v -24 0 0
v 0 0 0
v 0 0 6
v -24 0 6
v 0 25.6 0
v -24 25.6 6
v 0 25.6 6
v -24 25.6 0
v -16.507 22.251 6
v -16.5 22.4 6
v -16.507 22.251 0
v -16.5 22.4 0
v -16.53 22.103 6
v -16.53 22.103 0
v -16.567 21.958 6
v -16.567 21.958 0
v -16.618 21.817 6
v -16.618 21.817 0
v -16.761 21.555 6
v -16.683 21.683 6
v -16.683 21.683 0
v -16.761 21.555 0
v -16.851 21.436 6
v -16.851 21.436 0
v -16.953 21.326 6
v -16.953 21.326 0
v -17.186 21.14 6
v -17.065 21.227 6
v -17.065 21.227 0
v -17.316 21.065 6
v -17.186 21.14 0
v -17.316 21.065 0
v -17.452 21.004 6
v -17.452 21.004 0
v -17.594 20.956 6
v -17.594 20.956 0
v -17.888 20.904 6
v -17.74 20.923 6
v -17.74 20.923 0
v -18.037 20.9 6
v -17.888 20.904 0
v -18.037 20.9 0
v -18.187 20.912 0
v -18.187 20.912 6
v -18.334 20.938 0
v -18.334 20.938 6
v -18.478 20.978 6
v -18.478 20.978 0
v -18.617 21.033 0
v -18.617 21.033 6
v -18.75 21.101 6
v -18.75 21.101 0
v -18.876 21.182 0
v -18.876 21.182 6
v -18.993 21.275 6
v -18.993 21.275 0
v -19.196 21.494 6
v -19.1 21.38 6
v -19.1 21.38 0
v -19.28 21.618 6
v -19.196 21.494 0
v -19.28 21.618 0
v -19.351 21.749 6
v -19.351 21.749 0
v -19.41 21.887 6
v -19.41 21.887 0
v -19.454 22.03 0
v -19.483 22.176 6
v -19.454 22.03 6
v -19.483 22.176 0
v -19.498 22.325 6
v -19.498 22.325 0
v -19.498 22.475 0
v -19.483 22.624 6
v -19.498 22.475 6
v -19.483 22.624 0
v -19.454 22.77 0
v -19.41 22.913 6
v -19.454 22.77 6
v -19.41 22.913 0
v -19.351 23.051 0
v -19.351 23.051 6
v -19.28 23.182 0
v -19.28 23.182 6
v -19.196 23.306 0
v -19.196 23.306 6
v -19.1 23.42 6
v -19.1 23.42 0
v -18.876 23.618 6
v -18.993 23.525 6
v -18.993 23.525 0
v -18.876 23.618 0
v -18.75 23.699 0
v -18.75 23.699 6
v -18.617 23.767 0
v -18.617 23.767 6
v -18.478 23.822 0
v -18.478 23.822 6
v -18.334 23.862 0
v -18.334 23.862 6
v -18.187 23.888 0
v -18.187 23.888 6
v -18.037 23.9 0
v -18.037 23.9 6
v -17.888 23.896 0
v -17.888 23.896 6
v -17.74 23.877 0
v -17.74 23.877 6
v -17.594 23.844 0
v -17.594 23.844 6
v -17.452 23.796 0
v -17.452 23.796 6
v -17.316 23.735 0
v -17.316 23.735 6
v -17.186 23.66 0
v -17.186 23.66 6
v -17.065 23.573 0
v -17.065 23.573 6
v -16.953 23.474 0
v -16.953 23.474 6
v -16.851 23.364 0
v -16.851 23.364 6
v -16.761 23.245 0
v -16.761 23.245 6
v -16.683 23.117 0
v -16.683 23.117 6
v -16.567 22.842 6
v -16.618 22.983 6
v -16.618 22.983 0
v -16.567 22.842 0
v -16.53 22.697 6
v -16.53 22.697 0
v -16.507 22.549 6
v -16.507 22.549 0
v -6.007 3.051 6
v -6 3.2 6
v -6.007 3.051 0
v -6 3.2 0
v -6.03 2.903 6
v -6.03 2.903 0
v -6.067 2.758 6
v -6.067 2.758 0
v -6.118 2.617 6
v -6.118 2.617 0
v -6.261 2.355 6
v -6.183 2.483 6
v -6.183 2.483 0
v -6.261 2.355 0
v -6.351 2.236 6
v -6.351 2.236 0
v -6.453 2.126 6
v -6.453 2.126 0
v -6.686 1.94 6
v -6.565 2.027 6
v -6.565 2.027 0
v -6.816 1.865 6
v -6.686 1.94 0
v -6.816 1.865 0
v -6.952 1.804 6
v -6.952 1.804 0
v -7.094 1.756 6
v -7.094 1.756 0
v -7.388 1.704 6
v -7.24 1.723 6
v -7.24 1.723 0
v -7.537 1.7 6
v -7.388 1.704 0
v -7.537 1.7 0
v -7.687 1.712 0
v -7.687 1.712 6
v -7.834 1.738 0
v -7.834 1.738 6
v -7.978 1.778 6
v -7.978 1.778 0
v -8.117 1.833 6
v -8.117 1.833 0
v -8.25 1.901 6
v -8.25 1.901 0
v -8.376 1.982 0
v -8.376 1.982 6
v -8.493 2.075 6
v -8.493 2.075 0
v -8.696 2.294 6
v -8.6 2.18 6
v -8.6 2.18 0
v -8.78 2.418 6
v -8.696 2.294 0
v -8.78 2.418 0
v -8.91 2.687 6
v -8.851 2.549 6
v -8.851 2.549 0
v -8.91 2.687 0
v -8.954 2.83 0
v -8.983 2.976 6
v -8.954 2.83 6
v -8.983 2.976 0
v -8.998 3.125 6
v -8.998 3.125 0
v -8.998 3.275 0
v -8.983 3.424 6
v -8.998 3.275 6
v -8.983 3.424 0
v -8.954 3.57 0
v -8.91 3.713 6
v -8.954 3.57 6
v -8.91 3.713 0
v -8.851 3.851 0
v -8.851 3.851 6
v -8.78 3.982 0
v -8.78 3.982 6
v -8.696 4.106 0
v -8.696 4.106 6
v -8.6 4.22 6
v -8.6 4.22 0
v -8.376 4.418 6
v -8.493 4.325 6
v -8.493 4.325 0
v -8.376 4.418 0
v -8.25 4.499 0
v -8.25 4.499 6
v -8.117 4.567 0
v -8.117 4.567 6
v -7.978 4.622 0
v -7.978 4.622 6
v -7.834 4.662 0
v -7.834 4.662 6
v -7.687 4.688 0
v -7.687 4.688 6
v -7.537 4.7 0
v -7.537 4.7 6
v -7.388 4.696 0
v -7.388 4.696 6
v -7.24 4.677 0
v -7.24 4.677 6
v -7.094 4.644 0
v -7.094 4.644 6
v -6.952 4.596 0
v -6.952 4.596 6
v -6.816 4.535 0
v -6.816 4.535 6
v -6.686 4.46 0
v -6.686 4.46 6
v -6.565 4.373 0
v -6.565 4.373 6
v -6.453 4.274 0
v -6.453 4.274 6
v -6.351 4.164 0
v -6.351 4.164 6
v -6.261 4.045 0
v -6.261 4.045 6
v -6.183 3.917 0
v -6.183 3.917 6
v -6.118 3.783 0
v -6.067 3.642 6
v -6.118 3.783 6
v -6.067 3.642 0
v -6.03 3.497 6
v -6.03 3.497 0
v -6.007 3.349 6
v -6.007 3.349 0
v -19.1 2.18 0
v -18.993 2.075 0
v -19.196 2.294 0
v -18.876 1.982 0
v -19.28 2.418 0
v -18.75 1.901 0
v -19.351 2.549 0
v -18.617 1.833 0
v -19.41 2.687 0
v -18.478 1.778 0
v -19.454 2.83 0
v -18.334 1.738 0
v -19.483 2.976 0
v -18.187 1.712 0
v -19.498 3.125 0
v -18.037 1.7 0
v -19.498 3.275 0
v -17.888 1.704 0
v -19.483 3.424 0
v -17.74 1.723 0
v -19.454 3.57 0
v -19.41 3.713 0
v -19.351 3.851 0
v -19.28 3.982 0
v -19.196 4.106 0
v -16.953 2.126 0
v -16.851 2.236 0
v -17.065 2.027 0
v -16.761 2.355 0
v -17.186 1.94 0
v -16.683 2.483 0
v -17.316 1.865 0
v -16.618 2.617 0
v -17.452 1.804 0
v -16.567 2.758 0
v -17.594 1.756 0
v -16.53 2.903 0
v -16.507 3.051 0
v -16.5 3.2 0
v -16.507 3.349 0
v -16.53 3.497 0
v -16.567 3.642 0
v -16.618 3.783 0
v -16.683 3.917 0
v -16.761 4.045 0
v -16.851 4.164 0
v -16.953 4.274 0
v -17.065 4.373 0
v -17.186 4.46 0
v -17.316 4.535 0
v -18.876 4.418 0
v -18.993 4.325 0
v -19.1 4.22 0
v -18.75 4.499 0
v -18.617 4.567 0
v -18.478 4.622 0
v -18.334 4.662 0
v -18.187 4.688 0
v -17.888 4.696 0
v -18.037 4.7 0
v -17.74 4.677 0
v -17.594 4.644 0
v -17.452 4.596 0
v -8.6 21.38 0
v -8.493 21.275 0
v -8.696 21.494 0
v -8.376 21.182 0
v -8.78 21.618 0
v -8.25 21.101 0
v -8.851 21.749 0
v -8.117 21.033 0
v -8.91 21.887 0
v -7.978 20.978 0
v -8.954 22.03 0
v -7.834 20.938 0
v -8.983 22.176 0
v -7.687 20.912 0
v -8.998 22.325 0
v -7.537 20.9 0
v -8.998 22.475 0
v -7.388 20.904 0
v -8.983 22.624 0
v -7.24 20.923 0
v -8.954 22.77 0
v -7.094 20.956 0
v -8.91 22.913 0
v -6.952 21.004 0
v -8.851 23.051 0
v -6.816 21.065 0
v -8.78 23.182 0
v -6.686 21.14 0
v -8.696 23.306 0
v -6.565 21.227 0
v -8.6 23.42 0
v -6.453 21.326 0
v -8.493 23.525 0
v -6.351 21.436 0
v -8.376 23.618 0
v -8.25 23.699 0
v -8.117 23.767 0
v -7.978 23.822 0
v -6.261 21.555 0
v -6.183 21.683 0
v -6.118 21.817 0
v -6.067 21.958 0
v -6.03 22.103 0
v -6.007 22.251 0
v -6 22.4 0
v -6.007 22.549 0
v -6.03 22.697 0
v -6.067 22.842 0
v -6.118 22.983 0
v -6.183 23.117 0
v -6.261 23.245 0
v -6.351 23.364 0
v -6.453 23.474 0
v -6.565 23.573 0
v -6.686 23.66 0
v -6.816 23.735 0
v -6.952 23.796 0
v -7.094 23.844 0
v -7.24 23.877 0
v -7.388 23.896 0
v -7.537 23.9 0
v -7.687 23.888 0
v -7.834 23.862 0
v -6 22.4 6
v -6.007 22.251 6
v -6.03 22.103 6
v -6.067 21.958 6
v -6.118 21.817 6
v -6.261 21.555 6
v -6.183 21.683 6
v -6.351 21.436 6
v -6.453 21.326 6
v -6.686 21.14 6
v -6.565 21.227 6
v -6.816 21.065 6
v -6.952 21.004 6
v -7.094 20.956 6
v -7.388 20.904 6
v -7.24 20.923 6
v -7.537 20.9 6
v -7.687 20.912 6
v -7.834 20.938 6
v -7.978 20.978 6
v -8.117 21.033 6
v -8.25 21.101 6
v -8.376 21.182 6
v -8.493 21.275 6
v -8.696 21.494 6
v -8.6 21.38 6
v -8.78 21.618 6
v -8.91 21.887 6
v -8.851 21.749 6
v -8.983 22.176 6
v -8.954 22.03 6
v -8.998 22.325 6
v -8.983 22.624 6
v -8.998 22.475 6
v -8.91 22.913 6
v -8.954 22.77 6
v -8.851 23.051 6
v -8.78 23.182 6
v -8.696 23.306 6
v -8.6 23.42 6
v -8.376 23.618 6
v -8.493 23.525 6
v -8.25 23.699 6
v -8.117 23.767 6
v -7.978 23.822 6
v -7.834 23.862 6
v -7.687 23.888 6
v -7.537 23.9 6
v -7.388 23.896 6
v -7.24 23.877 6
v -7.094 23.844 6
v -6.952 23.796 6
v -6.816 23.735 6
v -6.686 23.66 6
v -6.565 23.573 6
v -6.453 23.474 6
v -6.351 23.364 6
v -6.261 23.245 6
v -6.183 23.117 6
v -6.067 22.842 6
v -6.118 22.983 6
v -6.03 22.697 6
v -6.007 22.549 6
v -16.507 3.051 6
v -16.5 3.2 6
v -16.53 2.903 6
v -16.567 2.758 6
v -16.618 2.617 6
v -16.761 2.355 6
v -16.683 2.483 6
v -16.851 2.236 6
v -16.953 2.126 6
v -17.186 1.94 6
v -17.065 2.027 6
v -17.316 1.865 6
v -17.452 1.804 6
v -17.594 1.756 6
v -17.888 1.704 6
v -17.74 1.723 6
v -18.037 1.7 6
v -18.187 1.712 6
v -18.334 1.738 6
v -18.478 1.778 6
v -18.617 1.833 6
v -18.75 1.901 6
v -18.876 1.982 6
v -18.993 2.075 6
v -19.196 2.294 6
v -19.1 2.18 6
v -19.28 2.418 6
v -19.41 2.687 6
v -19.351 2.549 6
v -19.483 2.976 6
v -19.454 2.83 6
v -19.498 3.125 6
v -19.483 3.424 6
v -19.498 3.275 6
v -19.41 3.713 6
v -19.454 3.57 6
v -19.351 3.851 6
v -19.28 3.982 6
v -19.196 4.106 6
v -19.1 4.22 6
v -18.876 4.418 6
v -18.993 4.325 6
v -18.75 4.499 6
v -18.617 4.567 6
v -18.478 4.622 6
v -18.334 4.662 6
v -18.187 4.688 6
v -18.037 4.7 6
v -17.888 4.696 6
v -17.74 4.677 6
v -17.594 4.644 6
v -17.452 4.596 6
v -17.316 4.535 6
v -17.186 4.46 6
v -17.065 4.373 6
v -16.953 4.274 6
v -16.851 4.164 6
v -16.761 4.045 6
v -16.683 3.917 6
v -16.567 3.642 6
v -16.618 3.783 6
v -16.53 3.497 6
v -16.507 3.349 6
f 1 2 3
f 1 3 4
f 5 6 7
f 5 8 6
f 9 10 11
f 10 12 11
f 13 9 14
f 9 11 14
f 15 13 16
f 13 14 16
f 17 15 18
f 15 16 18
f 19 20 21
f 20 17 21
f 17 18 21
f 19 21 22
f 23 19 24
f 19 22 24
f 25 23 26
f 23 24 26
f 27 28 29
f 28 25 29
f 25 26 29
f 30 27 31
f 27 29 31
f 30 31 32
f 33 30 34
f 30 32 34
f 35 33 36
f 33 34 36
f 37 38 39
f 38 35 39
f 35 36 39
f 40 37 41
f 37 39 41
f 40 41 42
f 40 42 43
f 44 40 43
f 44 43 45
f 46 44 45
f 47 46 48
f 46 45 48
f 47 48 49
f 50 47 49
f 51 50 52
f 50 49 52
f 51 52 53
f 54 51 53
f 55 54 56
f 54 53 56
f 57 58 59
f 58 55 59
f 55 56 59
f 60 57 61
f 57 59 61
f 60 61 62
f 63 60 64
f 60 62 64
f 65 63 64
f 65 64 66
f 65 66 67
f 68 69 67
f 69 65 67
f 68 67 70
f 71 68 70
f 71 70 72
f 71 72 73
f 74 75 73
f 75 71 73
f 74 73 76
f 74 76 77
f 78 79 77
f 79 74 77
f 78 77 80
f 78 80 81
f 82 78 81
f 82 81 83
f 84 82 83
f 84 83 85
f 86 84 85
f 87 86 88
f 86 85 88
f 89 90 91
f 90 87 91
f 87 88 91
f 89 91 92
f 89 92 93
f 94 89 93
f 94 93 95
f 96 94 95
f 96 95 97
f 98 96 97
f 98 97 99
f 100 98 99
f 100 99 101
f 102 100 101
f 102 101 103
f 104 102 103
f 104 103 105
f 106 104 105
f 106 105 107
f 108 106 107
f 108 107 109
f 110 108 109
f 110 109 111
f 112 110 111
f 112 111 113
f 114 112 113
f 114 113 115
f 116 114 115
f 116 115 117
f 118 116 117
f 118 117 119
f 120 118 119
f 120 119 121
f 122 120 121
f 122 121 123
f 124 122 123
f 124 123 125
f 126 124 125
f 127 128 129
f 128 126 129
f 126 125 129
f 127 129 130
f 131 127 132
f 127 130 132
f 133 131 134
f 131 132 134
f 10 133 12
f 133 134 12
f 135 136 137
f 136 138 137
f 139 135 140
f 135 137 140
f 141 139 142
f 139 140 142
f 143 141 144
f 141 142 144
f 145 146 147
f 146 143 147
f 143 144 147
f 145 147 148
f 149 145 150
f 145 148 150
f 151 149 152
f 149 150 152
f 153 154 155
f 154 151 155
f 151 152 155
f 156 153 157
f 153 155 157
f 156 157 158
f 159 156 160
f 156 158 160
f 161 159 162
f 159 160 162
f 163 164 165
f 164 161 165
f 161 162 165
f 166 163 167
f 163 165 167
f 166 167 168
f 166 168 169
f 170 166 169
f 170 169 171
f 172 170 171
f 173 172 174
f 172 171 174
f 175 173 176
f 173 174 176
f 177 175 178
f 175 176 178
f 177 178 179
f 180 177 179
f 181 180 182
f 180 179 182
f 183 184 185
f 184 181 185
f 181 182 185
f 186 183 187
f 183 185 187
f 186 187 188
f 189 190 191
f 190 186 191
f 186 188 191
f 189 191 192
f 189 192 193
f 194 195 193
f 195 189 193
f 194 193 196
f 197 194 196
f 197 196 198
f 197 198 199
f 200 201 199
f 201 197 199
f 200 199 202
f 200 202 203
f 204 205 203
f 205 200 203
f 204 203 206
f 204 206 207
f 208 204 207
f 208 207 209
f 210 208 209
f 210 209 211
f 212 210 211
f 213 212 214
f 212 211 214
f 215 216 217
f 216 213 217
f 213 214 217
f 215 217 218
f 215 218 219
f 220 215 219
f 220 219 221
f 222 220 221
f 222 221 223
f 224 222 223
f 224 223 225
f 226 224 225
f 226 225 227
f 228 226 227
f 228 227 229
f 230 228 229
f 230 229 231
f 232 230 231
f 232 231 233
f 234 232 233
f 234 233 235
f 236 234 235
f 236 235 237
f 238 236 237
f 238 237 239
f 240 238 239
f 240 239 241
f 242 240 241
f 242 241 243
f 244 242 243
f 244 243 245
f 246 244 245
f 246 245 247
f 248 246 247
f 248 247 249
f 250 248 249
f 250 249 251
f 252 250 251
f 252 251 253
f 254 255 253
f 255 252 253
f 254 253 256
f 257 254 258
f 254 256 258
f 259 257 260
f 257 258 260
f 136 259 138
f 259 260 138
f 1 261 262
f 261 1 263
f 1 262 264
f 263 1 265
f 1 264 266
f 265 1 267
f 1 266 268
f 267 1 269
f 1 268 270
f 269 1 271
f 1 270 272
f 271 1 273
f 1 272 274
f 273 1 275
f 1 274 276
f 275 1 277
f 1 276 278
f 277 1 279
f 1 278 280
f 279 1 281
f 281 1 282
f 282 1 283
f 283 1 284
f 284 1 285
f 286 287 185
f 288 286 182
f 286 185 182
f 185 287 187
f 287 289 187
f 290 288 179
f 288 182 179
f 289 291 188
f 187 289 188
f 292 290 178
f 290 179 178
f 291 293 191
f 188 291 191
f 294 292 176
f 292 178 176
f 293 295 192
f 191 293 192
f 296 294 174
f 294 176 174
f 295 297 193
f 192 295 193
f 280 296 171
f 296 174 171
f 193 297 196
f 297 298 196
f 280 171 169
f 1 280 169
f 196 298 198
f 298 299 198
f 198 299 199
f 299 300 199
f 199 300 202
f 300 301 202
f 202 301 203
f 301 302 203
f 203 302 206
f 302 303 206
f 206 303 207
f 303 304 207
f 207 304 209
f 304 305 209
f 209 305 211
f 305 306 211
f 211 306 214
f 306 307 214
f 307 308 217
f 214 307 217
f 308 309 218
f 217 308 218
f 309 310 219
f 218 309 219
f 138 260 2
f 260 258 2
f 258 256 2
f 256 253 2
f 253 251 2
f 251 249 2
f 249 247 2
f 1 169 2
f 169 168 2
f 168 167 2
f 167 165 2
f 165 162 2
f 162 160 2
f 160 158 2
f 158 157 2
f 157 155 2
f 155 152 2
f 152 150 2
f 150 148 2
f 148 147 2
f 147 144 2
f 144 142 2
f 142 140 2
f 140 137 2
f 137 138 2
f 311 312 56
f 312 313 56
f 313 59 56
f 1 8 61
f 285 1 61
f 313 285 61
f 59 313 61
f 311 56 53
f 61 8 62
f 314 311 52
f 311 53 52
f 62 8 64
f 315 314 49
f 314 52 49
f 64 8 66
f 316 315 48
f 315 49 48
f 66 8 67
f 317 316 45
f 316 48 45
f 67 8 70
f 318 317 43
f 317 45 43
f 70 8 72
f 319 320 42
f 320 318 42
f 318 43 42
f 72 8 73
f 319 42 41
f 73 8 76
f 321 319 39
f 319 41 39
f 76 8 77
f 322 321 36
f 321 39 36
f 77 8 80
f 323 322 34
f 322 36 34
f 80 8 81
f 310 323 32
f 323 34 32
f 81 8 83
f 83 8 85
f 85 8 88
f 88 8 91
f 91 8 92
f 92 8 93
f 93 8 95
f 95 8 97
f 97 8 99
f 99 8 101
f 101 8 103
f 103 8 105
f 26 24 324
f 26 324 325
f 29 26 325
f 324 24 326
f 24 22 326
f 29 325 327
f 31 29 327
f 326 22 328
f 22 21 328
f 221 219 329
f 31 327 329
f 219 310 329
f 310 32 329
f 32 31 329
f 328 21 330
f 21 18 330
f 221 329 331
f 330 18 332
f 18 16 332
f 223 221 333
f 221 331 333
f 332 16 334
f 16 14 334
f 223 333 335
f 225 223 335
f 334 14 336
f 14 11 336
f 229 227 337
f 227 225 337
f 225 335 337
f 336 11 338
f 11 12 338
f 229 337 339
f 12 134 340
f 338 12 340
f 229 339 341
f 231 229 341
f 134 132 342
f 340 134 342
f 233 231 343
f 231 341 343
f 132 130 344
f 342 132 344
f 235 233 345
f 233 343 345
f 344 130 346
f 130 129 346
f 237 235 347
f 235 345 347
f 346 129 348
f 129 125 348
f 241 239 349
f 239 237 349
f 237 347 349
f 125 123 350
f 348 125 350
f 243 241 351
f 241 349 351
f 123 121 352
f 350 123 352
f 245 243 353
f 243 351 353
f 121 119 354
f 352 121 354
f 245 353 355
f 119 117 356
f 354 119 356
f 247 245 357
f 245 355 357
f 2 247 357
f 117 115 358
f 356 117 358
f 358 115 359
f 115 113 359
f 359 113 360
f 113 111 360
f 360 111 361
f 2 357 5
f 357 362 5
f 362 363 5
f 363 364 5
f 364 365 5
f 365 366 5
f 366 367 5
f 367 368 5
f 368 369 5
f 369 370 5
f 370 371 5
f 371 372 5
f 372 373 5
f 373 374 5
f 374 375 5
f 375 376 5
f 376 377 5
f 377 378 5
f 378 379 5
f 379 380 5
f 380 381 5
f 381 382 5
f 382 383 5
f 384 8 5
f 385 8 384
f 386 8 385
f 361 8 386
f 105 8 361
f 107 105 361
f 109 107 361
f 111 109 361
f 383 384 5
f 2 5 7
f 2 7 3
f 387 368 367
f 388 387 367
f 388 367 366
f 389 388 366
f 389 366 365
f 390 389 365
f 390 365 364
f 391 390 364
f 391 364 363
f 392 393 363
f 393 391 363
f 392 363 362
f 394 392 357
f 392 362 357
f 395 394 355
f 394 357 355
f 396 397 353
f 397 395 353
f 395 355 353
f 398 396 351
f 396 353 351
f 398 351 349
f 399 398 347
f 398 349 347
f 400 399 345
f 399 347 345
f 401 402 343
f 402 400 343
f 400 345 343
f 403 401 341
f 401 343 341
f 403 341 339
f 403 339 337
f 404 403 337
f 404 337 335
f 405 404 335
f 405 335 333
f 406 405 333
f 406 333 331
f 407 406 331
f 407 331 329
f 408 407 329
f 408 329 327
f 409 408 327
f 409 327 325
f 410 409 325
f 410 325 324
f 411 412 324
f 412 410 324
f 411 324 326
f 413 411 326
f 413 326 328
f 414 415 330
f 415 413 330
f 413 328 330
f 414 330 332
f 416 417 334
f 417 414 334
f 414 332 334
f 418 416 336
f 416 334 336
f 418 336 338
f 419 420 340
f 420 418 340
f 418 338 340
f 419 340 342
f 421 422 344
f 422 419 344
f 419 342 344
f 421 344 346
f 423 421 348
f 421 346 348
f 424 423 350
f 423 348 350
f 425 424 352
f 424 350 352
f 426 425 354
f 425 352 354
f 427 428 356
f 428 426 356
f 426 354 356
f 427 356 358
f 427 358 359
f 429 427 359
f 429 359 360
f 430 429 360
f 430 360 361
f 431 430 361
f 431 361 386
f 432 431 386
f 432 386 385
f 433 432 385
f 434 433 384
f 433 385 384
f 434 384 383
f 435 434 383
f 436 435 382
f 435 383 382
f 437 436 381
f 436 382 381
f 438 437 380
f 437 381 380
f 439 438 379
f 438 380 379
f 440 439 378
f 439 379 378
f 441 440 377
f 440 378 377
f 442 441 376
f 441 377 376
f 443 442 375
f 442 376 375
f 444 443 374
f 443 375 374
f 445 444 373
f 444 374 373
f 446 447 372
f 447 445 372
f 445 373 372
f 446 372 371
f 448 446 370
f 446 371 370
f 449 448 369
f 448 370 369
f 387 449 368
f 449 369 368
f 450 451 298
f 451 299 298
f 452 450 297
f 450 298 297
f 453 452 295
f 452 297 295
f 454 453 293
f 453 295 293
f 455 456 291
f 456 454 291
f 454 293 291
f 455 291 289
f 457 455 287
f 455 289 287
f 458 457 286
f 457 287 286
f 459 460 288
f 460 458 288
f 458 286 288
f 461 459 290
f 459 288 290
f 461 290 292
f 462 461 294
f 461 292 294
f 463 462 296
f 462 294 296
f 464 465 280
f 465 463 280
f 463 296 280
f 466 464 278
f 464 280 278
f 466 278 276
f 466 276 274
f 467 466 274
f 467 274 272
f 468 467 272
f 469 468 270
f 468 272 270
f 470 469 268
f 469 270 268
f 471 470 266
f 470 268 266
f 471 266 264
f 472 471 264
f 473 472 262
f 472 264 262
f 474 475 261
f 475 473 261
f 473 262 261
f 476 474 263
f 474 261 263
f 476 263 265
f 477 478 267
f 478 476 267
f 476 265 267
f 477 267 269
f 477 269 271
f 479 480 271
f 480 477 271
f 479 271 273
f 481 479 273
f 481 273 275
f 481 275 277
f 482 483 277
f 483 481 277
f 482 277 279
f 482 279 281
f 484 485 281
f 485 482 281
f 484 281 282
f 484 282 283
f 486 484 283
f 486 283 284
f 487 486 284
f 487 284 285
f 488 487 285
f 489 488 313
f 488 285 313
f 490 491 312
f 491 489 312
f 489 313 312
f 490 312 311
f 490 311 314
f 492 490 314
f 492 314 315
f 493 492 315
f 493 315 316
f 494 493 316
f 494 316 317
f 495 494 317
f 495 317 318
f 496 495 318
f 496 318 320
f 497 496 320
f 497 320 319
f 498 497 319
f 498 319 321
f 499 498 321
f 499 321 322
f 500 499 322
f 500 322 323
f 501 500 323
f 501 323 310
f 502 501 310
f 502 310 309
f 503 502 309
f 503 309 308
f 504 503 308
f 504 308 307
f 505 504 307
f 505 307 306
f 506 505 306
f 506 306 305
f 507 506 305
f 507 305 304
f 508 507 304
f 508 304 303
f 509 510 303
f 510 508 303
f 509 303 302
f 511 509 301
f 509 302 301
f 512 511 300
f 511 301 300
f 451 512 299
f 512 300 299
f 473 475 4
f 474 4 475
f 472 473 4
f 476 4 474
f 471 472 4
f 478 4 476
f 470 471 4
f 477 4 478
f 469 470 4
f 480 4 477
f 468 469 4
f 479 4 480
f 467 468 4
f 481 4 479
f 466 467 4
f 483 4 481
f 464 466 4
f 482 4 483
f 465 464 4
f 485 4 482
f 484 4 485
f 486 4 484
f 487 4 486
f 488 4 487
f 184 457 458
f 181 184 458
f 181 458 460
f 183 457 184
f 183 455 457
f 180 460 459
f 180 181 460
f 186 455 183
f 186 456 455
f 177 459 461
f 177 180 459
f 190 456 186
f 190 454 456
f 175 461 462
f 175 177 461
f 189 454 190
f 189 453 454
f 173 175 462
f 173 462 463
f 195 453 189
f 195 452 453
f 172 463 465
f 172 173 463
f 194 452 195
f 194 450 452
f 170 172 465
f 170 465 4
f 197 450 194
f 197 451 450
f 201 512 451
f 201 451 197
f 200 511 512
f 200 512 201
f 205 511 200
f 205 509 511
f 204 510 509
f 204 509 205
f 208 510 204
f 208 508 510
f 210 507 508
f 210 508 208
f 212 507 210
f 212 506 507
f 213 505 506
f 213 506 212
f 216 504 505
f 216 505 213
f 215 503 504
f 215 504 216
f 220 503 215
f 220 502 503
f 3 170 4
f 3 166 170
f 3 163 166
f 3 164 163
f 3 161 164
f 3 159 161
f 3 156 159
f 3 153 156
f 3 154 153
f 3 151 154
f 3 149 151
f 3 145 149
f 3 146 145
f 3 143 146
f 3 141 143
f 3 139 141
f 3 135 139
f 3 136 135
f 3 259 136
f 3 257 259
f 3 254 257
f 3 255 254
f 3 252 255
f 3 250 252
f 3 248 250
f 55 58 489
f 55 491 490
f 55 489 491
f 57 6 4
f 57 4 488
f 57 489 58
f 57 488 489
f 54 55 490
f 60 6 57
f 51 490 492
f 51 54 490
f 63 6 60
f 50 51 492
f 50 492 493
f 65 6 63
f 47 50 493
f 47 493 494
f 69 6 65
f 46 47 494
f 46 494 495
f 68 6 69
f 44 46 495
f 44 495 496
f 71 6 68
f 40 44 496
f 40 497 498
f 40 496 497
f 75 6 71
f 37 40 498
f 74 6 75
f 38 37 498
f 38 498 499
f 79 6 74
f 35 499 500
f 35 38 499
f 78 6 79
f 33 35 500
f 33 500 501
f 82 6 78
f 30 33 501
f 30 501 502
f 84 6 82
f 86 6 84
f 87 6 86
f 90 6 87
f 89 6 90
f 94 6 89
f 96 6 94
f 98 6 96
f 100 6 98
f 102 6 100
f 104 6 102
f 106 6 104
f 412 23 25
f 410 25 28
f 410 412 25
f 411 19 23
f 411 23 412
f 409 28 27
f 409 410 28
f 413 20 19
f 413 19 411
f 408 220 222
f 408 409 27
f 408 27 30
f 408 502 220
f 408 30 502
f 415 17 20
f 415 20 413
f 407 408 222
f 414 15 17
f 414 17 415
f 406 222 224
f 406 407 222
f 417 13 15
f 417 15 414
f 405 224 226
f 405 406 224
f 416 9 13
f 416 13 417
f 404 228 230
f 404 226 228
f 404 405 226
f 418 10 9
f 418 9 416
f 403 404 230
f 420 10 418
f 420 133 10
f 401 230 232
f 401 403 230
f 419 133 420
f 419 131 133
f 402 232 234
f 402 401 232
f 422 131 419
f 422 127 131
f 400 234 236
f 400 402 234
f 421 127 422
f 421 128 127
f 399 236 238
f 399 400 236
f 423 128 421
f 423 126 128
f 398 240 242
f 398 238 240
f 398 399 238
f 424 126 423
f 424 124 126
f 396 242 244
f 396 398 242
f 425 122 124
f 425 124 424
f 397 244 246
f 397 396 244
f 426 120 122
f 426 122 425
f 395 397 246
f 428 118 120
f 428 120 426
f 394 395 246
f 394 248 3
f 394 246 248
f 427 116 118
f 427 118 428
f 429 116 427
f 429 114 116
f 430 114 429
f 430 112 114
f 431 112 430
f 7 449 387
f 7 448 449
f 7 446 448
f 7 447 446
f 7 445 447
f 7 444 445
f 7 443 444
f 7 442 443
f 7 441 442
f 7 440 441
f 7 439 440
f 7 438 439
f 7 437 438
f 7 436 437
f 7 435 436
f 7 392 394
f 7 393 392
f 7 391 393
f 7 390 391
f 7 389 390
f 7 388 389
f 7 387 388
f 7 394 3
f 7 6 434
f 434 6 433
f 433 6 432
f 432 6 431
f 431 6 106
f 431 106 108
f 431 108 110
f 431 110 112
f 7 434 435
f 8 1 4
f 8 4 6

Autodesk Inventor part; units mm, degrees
ref_plane "YZ Plane" through (0, 0, 0) normal (1, 0, 0) x (0, 1, 0)
ref_plane "XZ Plane" through (0, 0, 0) normal (0, 1, 0) x (-1, 0, 0)
ref_plane "XY Plane" through (0, 0, 0) normal (0, 0, 1) x (1, 0, 0)
sketch "Sketch1" plane through (0, 0, 0) normal (0, 0, 1) x (1, 0, 0)
  circle A0 centre (-7.5, 22.4) radius 1.5
  circle A1 centre (-7.5, 3.2) radius 1.5
  circle A2 centre (-18, 3.2) radius 1.5
  circle A3 centre (-18, 22.4) radius 1.5
  line L0 (0, 0) -> (-24, 0)
  line L1 (0, 25.6) -> (0, 0)
  line L2 (-24, 25.6) -> (0, 25.6)
  line L3 (-24, 0) -> (-24, 25.6)
extrude "Extrusion1" add sketch "Sketch1" along normal blind 6
properties part number "yCarBeltTensionerHolder"
